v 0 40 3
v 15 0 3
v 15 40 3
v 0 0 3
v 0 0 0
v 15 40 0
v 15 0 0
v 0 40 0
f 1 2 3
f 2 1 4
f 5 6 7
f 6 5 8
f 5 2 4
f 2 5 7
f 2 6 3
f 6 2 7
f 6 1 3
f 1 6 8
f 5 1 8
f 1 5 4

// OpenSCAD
$fn=360;
//67x93x22
x=15;
y=40;
z=3;
  translate([0,0,0])
  cube([x,y,z]);
